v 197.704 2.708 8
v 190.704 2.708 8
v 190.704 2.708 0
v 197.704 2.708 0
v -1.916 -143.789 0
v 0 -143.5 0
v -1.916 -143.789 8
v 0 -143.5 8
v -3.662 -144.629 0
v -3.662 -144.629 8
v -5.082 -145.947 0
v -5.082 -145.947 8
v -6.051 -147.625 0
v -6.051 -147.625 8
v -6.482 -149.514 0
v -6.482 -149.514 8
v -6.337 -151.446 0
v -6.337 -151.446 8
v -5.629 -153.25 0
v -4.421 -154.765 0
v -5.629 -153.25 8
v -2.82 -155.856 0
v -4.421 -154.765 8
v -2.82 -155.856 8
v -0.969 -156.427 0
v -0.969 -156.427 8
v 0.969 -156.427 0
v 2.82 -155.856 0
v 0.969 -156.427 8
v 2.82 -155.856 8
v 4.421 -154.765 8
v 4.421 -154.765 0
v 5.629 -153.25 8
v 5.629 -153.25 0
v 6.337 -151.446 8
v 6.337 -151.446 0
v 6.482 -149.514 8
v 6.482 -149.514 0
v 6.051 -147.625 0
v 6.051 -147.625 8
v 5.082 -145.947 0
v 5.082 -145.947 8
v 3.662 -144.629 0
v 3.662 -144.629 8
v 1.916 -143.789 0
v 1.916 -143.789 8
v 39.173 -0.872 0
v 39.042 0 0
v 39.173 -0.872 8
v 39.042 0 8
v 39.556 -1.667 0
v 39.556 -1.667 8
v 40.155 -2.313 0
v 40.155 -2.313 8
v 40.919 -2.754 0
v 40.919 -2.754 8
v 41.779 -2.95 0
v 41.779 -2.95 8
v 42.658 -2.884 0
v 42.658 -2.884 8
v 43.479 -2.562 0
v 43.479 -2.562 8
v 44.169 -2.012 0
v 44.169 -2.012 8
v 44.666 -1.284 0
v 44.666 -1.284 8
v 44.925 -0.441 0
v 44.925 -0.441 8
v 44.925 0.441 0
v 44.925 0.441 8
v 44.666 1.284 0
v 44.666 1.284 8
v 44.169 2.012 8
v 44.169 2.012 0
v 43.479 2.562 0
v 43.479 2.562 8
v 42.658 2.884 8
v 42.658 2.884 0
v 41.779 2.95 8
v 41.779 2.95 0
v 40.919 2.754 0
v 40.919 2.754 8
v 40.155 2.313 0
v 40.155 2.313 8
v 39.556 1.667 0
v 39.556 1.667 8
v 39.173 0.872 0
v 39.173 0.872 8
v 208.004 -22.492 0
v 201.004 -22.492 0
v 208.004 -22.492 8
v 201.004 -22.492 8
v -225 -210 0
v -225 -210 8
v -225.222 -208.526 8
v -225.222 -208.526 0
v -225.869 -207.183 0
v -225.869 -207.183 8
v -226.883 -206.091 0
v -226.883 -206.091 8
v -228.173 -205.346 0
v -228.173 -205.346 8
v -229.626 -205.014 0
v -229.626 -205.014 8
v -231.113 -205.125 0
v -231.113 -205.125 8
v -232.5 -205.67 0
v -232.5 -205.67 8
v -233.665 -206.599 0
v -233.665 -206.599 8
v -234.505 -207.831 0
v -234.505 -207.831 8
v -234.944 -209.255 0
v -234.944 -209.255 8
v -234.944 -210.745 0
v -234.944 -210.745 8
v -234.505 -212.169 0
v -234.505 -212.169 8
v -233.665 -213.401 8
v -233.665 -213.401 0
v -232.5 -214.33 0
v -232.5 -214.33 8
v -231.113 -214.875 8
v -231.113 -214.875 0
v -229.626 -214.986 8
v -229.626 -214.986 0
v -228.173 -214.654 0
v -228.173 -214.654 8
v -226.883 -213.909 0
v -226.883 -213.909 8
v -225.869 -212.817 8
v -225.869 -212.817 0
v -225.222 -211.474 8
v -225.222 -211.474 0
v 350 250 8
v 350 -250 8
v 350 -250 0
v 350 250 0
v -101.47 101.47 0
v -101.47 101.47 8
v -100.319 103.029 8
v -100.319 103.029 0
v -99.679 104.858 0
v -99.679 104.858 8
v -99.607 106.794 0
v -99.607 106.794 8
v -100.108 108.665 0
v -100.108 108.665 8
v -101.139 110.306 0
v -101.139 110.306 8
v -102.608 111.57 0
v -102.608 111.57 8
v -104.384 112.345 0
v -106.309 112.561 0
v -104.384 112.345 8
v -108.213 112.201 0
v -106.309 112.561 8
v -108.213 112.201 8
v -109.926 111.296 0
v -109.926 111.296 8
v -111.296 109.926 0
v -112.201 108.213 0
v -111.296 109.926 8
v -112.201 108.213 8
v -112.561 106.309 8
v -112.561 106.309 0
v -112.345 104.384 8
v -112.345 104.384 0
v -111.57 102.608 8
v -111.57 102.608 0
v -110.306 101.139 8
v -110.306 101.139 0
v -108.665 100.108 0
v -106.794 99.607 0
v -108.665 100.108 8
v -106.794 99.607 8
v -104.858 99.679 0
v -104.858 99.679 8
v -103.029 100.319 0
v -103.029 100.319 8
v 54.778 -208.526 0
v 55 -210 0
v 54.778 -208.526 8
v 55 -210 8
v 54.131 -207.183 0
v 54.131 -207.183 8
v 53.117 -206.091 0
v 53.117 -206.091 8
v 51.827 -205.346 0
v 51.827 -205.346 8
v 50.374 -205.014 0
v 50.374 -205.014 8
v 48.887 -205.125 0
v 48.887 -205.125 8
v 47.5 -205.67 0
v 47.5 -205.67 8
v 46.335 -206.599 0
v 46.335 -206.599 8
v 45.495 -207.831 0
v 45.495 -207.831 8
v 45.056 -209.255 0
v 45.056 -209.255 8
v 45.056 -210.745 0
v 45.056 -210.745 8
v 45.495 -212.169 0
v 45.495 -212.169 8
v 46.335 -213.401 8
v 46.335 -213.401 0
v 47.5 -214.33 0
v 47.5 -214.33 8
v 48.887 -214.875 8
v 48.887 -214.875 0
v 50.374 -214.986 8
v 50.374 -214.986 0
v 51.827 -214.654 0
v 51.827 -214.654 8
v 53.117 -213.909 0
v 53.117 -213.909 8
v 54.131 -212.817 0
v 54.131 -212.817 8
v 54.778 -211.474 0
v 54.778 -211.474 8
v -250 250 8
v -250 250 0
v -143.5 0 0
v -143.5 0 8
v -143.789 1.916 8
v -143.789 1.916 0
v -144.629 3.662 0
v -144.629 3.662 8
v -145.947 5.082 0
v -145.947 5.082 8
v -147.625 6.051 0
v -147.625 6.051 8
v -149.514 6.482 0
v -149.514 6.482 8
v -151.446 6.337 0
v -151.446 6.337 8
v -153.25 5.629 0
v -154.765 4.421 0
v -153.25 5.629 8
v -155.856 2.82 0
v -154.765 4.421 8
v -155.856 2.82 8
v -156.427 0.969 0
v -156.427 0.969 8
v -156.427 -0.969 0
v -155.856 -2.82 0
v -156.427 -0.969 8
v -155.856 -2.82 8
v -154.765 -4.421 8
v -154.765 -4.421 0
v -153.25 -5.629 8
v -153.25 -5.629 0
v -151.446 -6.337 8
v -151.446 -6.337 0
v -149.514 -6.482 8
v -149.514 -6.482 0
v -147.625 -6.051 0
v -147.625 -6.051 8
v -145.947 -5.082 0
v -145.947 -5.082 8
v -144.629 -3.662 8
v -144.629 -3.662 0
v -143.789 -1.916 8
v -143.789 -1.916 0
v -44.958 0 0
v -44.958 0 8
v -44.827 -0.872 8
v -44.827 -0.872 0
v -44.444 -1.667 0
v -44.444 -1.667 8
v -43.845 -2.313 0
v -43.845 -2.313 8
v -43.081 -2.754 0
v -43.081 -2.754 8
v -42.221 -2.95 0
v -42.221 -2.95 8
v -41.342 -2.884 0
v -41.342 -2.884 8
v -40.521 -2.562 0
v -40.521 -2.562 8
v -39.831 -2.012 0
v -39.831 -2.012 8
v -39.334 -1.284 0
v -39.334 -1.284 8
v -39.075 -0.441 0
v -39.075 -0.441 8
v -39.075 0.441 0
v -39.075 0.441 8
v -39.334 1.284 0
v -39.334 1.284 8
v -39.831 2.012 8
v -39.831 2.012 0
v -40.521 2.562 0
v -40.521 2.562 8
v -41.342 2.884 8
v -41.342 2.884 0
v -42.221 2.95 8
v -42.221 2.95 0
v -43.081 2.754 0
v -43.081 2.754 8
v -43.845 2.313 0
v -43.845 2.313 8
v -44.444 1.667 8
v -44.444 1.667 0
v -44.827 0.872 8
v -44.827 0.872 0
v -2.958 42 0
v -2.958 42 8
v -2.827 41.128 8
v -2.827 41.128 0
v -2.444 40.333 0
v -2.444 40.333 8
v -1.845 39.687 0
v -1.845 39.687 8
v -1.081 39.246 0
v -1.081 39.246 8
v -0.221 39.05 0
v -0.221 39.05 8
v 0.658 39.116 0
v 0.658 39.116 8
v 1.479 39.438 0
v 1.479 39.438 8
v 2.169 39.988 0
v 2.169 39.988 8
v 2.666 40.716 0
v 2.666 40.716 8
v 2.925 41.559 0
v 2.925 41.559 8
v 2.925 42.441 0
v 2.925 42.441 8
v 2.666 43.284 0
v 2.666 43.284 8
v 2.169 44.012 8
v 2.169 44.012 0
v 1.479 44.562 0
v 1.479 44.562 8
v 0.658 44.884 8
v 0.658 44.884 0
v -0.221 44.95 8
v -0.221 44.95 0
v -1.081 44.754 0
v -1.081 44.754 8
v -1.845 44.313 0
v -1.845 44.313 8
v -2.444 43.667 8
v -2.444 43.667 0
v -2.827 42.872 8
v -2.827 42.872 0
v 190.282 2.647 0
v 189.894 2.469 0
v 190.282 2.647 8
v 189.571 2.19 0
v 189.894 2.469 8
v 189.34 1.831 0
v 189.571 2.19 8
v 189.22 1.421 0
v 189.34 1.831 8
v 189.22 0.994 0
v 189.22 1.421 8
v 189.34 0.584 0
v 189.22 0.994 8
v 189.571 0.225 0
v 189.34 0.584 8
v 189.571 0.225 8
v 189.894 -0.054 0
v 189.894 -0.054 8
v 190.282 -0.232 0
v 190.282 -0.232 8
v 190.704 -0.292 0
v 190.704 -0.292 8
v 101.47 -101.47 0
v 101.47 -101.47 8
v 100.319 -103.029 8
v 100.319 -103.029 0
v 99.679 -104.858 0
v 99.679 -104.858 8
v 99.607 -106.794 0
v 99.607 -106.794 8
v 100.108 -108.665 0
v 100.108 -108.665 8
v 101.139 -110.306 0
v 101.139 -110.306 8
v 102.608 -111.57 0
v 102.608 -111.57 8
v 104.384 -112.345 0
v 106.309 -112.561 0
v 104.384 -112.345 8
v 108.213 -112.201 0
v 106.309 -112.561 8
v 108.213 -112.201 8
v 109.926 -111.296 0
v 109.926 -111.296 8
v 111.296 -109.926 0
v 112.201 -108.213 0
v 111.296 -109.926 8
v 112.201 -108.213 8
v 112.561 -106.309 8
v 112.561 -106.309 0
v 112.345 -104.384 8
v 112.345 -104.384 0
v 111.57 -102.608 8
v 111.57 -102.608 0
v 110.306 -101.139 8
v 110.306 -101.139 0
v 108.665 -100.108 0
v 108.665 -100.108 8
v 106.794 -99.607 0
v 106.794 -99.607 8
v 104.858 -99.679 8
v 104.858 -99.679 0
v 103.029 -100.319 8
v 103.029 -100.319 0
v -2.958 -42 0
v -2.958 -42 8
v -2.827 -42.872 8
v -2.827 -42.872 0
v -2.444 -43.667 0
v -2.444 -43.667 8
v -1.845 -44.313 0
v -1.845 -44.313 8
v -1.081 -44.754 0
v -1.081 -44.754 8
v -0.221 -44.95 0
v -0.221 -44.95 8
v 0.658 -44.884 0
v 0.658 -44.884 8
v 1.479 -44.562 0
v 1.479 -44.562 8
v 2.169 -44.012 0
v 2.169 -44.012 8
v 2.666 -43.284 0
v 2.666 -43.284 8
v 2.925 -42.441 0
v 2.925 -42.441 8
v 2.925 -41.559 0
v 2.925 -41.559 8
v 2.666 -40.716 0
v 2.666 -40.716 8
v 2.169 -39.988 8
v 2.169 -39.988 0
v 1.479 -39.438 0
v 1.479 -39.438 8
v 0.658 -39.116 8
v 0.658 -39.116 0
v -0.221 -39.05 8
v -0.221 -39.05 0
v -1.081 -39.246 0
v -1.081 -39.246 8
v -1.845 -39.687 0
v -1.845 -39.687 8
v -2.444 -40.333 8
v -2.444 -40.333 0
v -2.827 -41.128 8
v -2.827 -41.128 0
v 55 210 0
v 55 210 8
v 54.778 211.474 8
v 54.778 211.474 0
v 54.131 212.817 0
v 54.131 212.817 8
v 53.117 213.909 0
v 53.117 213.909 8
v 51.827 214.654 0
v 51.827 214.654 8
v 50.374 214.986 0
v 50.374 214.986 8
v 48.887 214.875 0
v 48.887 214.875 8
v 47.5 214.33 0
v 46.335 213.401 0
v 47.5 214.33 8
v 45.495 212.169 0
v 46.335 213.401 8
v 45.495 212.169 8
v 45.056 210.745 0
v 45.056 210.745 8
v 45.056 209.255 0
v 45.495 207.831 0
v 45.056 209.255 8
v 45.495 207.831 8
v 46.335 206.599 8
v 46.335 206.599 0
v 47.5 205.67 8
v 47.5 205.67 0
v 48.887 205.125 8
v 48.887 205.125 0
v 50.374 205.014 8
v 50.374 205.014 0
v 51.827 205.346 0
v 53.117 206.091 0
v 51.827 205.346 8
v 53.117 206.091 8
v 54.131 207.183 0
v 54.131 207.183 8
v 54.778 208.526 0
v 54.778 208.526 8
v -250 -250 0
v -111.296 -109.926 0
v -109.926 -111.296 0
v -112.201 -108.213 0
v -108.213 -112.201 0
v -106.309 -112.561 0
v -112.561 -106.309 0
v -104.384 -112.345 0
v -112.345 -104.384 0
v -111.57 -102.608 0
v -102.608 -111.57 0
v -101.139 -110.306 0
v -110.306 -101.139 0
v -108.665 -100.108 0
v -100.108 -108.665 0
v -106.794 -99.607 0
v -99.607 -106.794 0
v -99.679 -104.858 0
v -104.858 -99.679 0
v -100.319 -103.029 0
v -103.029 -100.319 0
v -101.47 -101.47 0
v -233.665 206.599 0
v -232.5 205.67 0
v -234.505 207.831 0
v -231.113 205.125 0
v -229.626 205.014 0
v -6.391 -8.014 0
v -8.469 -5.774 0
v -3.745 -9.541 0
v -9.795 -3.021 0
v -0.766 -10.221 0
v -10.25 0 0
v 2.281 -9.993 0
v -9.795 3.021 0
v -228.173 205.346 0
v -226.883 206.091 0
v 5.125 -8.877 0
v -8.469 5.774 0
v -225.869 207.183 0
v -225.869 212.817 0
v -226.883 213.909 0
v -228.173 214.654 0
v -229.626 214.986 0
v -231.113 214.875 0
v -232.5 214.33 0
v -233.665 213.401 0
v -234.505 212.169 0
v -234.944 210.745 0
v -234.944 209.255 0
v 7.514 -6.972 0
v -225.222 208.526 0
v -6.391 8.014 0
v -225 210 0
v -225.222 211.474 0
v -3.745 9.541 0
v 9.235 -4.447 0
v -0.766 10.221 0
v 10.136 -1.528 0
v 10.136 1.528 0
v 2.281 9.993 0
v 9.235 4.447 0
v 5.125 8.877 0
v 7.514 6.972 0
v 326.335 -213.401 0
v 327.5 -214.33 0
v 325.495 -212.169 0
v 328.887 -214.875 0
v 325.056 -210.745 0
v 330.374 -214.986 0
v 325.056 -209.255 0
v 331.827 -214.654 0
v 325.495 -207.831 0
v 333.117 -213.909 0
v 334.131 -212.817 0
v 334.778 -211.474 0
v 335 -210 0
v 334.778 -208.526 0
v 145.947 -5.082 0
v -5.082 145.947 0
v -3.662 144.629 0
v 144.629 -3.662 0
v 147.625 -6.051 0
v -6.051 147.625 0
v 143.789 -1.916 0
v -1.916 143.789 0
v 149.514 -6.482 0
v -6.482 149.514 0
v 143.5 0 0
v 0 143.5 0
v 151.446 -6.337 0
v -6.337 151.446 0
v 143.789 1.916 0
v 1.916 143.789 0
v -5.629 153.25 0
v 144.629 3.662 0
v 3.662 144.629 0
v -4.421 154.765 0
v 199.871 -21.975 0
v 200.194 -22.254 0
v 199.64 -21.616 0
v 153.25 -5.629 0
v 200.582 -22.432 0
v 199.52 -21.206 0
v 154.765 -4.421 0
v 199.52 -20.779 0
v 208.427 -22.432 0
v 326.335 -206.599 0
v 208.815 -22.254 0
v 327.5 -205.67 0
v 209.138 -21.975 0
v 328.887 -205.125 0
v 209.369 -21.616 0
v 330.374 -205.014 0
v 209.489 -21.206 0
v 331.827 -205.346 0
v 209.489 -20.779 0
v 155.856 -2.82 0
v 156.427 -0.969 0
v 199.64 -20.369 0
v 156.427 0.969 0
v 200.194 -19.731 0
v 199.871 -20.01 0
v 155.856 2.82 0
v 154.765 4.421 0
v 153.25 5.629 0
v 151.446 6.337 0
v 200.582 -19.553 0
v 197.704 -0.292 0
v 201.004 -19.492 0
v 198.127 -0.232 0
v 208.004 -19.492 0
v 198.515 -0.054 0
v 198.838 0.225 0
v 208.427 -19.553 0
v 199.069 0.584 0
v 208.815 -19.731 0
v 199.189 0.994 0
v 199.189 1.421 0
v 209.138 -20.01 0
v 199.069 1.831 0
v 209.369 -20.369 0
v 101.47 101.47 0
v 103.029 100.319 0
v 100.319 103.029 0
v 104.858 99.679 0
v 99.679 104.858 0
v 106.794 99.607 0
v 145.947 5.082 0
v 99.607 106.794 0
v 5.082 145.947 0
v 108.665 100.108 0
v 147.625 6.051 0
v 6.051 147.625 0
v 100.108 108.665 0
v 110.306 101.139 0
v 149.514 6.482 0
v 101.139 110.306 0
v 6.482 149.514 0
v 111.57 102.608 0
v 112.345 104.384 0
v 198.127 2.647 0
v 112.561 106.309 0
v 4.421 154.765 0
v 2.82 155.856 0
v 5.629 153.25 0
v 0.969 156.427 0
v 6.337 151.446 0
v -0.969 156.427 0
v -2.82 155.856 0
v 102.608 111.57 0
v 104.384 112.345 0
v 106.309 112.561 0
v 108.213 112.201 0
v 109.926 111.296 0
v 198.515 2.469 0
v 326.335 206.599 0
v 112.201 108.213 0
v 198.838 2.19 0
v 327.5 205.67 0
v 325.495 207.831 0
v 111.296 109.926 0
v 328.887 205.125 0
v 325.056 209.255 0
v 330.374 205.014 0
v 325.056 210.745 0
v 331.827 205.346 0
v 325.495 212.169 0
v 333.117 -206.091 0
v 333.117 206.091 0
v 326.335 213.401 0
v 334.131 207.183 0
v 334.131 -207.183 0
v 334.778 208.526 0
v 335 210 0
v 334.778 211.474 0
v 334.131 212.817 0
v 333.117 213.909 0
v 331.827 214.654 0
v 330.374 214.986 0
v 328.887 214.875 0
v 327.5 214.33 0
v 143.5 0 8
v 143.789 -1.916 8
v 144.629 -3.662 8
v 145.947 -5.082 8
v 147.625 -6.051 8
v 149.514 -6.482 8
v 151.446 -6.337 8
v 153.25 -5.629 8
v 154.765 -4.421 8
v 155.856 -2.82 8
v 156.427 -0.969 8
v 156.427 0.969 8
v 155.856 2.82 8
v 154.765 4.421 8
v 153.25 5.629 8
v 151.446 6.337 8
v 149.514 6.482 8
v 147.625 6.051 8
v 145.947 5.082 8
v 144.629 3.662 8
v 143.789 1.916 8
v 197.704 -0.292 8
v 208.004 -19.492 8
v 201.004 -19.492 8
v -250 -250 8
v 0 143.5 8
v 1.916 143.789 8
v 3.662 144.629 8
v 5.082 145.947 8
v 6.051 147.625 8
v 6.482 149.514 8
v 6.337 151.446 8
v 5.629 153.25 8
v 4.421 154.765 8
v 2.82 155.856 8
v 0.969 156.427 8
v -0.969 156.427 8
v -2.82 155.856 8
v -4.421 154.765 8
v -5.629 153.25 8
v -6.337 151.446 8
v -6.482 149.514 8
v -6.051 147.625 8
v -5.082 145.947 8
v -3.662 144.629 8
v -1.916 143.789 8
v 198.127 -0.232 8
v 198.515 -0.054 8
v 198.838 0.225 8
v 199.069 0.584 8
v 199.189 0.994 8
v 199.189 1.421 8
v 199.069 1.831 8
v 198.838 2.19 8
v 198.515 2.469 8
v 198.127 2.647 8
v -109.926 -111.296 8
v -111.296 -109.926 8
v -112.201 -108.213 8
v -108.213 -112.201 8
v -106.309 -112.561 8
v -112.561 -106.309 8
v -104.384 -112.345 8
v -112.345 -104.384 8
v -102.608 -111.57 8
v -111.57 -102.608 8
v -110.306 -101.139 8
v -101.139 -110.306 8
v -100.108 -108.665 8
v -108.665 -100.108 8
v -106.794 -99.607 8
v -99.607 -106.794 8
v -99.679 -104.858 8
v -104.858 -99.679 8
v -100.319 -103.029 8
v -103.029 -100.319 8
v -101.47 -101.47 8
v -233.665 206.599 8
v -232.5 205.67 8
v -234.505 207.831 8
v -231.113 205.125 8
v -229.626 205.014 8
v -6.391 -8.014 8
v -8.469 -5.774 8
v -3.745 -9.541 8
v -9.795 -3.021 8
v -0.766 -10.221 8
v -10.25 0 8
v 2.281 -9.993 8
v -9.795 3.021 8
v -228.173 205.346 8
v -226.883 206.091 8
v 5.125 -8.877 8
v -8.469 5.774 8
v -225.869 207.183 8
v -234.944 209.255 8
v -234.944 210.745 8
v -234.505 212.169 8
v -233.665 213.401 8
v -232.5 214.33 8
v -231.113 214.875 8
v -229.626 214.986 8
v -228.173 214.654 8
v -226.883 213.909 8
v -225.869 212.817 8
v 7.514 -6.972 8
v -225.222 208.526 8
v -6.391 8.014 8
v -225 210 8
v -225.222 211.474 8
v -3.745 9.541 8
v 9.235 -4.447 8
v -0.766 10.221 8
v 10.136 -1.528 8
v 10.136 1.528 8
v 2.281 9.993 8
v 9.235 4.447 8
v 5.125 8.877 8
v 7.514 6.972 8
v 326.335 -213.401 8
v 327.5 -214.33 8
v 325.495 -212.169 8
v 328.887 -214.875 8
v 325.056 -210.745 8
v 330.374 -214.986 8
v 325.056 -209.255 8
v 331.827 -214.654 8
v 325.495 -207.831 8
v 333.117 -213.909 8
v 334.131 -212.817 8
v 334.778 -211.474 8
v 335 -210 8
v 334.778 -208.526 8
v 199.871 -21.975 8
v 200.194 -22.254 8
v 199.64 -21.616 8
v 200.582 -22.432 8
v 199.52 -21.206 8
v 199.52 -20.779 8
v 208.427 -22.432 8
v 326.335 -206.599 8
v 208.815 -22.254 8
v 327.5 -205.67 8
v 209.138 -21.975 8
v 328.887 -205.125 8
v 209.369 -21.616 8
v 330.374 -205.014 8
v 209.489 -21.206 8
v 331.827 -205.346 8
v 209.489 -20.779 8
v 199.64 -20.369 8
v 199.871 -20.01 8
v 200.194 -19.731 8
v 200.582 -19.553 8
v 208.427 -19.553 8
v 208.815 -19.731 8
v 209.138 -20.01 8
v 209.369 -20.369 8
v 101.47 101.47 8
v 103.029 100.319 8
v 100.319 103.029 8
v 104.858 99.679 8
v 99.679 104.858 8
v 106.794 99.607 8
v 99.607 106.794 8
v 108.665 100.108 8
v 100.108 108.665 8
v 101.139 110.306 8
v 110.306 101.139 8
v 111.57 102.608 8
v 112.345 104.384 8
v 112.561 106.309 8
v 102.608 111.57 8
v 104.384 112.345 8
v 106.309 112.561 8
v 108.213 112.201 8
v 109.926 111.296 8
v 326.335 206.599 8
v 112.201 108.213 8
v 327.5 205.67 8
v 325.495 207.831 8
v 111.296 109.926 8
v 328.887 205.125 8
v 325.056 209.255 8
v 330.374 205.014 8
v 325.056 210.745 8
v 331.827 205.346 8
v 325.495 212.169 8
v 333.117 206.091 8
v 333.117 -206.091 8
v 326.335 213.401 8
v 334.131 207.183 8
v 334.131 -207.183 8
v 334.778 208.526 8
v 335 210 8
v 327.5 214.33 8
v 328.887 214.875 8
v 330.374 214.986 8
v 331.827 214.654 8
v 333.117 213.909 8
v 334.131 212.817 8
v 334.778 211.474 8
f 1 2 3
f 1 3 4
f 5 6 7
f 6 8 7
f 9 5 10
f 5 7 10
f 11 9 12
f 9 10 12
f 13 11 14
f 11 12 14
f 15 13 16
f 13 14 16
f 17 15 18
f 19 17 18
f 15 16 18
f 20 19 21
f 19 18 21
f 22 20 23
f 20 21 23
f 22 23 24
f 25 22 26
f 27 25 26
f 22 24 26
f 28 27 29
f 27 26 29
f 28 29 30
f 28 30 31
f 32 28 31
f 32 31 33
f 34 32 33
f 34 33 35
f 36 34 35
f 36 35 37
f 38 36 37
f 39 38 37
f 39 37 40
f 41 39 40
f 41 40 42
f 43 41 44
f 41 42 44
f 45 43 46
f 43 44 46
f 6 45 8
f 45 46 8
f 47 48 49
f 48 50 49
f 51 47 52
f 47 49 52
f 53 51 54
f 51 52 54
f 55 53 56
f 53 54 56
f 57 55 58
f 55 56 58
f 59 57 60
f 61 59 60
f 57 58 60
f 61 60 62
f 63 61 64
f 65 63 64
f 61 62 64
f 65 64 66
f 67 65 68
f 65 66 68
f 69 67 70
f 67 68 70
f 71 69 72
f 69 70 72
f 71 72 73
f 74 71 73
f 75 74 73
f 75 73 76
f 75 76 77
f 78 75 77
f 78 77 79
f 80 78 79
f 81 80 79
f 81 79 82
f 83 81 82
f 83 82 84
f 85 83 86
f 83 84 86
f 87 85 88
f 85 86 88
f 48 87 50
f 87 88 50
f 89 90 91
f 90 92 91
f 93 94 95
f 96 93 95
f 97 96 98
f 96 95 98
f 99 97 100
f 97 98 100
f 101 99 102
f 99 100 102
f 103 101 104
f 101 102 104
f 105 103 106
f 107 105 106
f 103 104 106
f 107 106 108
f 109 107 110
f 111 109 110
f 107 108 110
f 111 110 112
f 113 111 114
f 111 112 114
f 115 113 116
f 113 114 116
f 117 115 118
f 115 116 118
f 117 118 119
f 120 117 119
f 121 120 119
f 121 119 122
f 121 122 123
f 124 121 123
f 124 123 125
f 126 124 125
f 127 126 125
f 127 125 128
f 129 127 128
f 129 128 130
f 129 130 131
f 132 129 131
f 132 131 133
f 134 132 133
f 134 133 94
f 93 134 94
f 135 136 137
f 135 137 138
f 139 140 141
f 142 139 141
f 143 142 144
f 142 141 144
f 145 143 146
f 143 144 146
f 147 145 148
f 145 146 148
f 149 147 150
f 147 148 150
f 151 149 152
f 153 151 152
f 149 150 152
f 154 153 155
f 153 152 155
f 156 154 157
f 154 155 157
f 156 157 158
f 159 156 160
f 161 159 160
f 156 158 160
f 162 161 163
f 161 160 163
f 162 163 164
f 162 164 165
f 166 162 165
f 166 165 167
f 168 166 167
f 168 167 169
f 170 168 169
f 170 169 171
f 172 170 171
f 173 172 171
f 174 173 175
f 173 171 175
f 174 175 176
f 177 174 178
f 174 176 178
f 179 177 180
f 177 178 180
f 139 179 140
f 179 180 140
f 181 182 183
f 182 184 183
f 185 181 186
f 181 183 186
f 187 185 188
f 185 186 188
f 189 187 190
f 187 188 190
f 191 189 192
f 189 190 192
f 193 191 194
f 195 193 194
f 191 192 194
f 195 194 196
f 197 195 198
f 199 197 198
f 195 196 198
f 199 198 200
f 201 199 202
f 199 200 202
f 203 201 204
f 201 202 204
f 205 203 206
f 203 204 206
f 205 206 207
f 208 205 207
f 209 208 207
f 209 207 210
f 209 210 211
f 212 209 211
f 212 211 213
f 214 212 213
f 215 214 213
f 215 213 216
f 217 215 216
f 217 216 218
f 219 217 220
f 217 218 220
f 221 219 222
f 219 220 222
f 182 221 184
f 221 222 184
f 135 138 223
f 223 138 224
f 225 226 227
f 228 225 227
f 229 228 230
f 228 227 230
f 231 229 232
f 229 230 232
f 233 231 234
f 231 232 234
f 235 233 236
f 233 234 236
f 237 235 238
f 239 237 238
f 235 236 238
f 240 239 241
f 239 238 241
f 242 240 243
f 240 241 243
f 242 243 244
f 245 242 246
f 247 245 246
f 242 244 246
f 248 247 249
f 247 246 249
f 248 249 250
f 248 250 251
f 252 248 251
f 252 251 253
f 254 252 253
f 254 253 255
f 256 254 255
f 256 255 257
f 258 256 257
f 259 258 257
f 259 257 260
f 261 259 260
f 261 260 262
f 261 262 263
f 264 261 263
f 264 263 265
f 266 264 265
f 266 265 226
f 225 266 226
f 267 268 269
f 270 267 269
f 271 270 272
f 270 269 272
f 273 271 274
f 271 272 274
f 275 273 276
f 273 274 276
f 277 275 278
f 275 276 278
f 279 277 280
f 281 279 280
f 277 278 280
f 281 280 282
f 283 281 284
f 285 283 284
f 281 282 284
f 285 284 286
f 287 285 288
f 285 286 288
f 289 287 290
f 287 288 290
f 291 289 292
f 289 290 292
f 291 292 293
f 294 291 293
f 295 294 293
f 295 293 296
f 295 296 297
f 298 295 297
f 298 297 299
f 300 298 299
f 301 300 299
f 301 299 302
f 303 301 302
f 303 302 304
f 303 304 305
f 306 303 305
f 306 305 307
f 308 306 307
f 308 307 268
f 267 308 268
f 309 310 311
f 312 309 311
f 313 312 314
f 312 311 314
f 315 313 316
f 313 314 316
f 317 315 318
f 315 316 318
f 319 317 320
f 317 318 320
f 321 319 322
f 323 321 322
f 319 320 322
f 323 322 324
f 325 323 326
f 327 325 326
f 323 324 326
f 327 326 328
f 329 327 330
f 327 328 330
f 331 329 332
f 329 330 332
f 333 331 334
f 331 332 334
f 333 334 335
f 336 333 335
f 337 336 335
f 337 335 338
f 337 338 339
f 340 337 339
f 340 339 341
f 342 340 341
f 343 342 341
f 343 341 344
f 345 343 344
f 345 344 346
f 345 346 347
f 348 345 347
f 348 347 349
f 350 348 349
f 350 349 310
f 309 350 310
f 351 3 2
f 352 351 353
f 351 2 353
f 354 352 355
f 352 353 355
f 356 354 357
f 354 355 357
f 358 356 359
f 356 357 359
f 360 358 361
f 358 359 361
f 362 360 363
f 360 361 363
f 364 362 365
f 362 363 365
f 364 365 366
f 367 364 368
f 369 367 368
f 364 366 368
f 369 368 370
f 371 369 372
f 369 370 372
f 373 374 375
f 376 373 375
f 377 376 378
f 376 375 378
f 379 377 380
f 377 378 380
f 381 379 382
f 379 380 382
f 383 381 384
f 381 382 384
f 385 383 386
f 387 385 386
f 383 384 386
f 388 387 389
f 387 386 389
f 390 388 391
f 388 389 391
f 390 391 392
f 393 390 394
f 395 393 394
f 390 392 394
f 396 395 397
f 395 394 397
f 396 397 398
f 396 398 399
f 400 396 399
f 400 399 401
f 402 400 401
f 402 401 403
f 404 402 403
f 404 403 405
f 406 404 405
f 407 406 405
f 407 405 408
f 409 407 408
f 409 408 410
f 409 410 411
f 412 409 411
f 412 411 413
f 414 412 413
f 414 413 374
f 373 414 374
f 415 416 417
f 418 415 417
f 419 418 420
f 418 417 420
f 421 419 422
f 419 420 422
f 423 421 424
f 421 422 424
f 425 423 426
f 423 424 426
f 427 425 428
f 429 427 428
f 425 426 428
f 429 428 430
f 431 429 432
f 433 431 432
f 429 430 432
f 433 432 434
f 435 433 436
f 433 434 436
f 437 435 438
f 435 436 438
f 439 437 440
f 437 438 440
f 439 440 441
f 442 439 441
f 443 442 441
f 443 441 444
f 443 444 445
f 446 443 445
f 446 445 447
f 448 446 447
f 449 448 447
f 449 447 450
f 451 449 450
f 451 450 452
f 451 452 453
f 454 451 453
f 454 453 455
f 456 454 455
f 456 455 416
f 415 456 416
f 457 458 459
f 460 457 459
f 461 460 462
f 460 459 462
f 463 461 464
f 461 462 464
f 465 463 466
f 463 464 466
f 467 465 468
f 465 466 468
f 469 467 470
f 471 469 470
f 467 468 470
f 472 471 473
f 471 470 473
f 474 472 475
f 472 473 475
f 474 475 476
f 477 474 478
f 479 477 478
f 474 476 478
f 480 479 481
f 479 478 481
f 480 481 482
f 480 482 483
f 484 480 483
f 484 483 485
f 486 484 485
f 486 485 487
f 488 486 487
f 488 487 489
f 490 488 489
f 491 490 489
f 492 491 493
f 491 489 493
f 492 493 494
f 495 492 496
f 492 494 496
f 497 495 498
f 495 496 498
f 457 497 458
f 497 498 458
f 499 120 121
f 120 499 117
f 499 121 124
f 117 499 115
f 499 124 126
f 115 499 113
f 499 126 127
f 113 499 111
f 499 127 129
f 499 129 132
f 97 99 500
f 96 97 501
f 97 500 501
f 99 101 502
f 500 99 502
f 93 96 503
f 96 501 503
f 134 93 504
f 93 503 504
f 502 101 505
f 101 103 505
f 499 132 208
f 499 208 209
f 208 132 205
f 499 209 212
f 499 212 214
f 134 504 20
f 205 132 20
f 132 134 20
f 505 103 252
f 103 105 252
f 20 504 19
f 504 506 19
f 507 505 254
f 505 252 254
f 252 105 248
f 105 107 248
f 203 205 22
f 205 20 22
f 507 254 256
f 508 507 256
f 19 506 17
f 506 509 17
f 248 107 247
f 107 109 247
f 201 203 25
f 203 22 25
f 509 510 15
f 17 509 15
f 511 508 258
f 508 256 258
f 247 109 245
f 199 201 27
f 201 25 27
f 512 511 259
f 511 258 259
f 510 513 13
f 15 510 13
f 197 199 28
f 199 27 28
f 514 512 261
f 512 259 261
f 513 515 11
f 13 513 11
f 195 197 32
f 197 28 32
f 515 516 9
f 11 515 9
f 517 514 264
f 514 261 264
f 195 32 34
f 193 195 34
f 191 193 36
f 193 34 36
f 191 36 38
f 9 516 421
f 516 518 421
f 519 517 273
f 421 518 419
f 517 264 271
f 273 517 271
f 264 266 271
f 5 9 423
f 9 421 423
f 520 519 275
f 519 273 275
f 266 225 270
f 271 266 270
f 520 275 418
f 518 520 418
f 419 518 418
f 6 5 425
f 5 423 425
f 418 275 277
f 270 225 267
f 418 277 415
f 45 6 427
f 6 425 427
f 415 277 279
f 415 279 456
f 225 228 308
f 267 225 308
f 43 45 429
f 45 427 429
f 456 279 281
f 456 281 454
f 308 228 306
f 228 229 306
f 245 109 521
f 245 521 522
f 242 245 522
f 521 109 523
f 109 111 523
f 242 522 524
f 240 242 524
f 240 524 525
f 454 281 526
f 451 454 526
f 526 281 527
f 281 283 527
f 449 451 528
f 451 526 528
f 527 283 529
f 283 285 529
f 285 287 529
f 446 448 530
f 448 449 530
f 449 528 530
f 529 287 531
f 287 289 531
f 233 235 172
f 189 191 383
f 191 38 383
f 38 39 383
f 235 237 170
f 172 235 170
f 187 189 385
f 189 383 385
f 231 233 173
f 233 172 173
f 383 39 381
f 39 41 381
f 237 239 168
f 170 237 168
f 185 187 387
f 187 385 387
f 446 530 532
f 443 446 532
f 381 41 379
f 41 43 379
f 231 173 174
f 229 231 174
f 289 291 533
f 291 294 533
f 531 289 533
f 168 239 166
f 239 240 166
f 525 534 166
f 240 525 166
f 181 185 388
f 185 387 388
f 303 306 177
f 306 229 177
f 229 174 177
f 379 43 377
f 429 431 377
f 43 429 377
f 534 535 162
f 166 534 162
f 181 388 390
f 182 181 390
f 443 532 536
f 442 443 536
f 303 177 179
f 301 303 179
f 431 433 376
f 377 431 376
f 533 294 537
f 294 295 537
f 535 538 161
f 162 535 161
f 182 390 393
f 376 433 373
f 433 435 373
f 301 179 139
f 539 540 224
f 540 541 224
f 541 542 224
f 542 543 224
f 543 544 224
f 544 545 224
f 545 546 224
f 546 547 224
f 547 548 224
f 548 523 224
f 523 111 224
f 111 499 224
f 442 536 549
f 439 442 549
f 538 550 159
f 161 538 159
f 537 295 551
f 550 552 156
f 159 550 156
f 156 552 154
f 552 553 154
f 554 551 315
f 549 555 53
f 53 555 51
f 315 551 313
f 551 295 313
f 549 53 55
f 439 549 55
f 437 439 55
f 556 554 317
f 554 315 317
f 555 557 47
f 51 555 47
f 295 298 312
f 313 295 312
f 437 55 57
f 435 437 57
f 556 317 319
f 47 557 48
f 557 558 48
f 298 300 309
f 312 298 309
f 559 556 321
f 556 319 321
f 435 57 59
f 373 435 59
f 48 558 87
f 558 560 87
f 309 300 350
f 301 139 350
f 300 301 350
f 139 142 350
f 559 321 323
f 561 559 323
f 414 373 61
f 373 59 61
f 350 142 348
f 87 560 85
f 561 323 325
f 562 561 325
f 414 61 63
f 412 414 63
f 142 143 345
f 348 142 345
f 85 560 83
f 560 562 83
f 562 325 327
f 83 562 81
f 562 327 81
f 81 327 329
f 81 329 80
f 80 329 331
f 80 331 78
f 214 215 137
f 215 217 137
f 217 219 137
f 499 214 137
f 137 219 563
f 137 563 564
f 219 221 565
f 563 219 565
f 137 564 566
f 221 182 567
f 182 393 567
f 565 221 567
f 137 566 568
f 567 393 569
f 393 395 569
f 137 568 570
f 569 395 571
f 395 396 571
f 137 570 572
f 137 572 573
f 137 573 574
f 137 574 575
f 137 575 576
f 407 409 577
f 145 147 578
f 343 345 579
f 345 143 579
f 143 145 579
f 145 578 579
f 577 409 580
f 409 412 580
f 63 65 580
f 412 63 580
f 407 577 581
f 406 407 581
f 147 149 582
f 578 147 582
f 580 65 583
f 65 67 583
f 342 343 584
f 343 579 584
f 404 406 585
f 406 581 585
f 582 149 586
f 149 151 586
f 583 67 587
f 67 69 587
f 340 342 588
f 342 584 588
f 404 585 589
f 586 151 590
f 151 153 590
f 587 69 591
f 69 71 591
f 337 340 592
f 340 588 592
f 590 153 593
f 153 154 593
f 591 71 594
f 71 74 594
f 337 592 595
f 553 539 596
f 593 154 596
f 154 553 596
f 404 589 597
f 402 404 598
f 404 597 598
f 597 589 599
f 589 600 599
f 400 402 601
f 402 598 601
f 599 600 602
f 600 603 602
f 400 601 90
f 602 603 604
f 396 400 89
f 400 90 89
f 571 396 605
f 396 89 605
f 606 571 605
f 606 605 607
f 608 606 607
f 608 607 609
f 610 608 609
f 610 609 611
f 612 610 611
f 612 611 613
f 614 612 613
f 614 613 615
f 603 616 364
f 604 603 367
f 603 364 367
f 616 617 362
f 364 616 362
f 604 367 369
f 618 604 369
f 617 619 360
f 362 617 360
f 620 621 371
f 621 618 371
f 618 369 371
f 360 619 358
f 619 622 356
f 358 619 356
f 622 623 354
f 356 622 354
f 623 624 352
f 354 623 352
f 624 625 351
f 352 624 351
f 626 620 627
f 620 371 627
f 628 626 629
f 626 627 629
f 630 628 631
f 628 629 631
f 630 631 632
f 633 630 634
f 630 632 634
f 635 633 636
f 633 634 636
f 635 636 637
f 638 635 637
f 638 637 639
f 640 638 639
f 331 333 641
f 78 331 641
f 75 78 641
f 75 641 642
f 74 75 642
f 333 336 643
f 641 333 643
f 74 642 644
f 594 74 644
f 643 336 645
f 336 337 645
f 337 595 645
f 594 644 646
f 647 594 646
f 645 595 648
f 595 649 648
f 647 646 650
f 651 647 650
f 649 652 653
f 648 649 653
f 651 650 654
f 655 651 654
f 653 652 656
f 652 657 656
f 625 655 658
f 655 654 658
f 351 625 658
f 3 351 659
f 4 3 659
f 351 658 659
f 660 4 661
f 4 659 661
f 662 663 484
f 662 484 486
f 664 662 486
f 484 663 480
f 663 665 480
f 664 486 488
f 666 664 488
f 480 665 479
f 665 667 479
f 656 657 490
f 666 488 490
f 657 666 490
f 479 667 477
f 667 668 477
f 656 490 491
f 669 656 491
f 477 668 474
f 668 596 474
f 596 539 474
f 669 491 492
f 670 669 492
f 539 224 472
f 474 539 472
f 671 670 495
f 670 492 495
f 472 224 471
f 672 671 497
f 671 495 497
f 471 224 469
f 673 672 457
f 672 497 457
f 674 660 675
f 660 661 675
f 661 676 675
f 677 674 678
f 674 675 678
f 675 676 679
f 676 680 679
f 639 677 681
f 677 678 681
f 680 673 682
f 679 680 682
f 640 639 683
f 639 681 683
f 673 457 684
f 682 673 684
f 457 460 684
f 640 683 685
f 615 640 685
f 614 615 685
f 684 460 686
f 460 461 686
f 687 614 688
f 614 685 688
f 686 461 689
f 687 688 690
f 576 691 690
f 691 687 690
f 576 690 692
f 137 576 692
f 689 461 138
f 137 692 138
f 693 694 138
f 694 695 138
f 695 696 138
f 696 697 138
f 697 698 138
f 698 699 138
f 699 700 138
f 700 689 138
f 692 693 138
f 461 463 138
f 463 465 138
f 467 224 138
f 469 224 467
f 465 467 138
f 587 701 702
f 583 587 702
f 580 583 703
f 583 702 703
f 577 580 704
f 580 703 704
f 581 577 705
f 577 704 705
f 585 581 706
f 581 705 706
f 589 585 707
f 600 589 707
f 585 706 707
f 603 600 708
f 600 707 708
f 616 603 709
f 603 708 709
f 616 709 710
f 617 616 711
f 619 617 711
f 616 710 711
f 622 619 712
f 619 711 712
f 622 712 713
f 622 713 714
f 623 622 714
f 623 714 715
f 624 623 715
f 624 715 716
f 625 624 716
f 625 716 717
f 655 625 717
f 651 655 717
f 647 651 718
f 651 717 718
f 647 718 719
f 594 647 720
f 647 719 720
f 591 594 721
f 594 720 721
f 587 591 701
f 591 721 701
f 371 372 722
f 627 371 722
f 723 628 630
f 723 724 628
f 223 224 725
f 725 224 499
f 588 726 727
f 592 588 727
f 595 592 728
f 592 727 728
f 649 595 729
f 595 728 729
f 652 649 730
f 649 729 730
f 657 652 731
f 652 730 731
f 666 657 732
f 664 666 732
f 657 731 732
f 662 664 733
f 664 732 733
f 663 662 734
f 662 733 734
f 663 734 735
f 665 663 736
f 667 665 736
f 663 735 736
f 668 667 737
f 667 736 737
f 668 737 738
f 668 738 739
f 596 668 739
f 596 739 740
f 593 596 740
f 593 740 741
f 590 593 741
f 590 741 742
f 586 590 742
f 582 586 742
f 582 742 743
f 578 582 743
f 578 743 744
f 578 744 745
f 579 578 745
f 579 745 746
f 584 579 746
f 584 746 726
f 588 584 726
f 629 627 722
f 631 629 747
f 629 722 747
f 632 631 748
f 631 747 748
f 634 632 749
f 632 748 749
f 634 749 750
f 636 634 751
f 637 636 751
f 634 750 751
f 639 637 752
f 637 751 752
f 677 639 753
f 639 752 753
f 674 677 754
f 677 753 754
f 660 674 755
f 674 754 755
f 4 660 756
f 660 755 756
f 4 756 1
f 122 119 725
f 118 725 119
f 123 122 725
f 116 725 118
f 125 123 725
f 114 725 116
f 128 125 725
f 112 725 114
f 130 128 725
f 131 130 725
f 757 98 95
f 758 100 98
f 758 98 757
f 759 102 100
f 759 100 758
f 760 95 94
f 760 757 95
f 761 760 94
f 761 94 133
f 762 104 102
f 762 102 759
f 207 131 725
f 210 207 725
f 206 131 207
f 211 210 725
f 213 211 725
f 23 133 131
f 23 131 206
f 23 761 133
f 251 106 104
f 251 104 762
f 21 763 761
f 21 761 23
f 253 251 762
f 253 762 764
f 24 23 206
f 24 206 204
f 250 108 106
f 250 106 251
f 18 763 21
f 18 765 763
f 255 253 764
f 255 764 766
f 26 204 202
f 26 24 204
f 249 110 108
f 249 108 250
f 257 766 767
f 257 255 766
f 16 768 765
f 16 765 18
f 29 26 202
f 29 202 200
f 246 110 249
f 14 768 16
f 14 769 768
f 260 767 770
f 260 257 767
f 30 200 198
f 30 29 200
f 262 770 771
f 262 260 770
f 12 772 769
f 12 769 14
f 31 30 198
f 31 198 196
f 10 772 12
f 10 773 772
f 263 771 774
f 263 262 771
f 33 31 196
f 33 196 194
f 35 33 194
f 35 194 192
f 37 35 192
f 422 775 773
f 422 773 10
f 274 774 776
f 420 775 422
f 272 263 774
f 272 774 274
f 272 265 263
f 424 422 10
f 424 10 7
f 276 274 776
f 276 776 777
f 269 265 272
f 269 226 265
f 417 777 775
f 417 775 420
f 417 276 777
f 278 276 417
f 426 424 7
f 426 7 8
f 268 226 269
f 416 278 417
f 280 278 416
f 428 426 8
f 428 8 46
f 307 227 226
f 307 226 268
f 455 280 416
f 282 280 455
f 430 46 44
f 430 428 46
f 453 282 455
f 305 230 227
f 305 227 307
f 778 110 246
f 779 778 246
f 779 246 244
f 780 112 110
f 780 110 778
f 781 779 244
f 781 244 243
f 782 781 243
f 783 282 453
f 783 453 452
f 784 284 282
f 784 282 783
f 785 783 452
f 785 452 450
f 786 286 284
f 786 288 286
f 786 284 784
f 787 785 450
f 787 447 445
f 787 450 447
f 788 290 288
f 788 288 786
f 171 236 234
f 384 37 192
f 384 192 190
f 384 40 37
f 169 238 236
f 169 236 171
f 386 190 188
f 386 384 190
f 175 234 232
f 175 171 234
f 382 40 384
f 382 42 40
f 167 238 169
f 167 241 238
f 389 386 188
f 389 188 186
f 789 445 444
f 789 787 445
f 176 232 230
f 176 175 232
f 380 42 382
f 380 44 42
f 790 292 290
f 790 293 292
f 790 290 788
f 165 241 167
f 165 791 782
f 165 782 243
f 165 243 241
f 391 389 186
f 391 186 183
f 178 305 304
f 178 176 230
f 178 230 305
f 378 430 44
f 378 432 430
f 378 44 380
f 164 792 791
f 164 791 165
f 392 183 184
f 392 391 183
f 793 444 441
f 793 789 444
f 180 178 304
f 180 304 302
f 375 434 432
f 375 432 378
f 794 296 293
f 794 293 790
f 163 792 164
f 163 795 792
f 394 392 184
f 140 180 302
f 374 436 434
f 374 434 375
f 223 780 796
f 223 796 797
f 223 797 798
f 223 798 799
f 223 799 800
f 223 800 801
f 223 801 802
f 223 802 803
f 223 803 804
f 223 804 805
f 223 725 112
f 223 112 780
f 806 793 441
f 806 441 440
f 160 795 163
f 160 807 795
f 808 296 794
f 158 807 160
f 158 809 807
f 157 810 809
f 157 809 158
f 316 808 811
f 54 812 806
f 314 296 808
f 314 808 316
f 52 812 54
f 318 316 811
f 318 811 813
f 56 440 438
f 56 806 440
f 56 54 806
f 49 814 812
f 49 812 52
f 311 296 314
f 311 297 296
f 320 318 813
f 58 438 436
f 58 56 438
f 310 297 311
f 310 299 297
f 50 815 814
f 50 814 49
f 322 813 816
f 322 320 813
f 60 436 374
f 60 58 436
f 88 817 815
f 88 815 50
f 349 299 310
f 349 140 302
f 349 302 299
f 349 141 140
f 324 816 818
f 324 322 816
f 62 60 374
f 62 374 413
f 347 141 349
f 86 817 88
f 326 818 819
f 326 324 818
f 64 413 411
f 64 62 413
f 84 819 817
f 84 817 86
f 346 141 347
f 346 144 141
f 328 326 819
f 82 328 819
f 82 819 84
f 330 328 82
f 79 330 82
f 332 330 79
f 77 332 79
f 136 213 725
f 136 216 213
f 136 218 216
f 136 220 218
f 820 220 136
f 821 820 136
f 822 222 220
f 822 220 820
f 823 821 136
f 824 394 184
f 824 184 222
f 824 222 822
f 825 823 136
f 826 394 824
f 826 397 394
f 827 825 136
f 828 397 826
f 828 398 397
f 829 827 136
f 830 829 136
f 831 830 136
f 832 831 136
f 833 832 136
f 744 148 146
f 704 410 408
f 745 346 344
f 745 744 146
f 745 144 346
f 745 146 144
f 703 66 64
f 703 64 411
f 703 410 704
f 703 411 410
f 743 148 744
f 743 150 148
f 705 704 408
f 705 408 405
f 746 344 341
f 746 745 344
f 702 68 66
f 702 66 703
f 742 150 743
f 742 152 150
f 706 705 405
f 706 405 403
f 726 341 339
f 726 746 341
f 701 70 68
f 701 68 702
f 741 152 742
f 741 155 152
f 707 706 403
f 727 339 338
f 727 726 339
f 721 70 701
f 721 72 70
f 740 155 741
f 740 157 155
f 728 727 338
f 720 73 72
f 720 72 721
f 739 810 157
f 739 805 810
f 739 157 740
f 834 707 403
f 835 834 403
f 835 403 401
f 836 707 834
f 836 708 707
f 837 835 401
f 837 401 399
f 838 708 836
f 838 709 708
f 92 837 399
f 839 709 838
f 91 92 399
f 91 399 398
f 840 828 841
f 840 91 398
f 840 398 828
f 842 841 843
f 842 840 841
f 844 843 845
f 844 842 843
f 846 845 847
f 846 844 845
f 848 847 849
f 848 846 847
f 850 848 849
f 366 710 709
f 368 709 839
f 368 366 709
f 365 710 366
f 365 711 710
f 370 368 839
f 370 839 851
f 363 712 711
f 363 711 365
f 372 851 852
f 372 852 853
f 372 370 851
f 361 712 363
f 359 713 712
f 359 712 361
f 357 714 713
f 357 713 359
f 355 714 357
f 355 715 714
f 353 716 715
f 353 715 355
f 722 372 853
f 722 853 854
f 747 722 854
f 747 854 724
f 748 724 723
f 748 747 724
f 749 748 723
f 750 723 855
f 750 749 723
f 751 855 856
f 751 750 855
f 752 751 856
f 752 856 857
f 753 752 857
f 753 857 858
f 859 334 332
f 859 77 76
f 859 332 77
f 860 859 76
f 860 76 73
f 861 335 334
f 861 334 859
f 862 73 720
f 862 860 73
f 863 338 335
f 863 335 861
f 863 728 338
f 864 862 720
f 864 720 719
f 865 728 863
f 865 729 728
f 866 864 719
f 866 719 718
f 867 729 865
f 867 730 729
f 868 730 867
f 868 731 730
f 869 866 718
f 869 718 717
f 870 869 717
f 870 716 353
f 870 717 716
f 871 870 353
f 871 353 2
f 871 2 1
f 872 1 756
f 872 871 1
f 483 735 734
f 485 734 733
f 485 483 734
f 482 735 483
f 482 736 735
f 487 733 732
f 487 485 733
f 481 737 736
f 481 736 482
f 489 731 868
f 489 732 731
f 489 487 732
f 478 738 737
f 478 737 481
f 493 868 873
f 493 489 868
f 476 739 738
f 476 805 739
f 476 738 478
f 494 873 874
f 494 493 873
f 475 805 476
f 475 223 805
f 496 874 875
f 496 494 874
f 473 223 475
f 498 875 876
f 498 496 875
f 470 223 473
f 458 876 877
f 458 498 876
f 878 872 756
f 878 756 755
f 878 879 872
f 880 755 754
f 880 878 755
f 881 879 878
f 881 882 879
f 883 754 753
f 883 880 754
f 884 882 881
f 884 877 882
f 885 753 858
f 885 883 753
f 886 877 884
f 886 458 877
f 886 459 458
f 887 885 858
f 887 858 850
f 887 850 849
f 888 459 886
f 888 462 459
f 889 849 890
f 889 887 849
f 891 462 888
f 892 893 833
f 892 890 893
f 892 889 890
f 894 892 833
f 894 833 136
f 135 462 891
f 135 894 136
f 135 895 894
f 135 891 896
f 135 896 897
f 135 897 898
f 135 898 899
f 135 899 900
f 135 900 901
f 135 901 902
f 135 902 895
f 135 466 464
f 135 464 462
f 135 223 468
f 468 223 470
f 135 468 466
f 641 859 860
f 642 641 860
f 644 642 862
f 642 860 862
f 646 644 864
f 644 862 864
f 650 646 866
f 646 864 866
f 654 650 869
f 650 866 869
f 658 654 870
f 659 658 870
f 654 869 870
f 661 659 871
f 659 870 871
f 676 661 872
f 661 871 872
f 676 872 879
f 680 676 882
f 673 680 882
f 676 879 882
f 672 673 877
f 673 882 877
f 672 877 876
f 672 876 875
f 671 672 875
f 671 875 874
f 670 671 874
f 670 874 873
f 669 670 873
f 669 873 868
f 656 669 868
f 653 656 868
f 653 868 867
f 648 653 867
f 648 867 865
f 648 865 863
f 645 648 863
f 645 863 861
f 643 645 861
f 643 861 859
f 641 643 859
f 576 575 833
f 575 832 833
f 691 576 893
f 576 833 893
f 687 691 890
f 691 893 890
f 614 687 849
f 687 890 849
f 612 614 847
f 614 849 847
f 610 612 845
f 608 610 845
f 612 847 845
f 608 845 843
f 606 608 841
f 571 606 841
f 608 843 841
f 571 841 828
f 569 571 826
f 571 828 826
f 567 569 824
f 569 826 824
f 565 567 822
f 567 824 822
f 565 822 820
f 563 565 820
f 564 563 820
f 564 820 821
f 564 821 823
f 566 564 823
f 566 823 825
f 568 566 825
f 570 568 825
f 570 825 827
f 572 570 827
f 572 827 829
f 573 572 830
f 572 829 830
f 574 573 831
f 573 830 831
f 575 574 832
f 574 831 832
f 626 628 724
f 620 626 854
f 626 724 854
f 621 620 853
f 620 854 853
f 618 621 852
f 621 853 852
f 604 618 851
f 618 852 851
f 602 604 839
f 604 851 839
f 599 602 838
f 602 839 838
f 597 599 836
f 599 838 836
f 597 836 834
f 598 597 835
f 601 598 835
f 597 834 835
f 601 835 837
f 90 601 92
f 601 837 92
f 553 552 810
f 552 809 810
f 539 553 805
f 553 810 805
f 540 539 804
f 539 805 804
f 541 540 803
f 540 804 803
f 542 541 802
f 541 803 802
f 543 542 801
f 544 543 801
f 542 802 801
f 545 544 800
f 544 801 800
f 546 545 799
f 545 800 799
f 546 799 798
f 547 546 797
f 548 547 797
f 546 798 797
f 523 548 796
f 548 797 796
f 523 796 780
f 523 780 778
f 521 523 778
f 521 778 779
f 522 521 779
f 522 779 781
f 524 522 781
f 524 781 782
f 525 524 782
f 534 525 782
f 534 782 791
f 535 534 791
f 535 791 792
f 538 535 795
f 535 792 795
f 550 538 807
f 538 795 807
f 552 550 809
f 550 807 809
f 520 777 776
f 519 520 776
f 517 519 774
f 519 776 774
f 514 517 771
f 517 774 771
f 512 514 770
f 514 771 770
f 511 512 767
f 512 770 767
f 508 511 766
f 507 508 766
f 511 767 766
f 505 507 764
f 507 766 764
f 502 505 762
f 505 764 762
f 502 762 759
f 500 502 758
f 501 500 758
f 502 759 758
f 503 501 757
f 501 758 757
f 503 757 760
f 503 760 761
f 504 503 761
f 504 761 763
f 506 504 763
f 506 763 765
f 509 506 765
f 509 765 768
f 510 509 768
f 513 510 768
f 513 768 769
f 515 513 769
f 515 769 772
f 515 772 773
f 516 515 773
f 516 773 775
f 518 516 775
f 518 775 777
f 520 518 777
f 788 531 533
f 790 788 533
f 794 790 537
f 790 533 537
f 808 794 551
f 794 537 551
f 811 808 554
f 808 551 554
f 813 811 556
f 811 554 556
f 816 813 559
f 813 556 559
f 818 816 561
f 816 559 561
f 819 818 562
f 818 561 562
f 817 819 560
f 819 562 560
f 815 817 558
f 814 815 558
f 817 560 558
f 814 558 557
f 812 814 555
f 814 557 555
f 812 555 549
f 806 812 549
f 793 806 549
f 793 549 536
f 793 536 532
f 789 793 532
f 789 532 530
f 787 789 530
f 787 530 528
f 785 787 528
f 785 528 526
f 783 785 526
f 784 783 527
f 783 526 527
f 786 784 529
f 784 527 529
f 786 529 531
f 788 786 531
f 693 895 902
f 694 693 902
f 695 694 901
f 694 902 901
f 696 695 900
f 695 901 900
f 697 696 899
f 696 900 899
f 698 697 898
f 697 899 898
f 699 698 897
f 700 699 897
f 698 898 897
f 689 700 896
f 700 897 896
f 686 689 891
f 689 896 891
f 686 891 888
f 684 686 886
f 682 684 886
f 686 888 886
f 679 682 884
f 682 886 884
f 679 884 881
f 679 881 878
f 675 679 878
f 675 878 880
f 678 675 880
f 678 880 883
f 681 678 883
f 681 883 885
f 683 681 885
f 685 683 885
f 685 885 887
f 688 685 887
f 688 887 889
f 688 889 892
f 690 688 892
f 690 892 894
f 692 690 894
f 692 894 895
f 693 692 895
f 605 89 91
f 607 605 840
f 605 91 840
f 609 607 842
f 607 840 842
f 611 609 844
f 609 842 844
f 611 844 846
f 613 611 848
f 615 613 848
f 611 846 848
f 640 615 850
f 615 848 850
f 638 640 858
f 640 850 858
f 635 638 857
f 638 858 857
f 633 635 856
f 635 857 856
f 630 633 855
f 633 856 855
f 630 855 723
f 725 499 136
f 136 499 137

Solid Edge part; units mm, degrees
sketch "Sketch1" plane through (0, 0, 0) normal (0, 0, 1) x (1, 0, 0)
  line L0 (-250, -250) -> (250, -250)
  line L1 (250, -250) -> (250, 250)
  line L2 (250, 250) -> (-250, 250)
  line L3 (-250, 250) -> (-250, -250)
extrude "ProtrusioneEstrusa_1" add sketch "Sketch1" along normal blind 8
hole "Foro_1" at (0, 150, 8) direction (0, 0, -1) diameter 13 end through all
pattern_circular "Pattern1" count 8 over 360 about axis through (0, 0, 8) along (0, 0, -1) of "Foro_1"
sketch "Sketch2" plane through (0, 0, 0) normal (0, 0, -1) x (-1, 0, 0)
  circle A0 centre (0, 0) radius 10.25
extrude "Cutout1" cut sketch "Sketch2" against normal through all
sketch "Sketch3" plane through (0, 0, 8) normal (0, 0, 1) x (-1, 0, 0)
  circle A0 centre (0, 42) radius 2.9585
  circle A1 centre (42, 0) radius 2.9585
  circle A2 centre (0, -42) radius 2.9585
  circle A3 centre (-42, 0) radius 2.9585
extrude "Cutout2" cut sketch "Sketch3" against normal through all
sketch "Sketch4" plane through (0, 0, 8) normal (0, 0, 1) x (1, 0, 0)
  line L0 (250, -250) -> (350, -250)
  line L1 (350, -250) -> (350, 250)
  line L2 (250, 250) -> (350, 250)
  line L3 (250, -250) -> (250, 250)
extrude "Protrusion1" add sketch "Sketch4" against normal up to vertex (8 mm away)
sketch "Sketch5" plane through (50, 0, 8) normal (0, 0, 1) x (1, 0, 0)
  circle A0 centre (-280, -210) radius 5
  circle A1 centre (0, -210) radius 5
  circle A2 centre (280, -210) radius 5
  dimension "D1" = 20
  dimension "D2" = 20
extrude "Cutout3" cut sketch "Sketch5" against normal through all
mirror "Mirror1" about plane through (0, 0, 0) normal (0, -1, 0) of "Cutout3"
sketch "Sketch6" plane through (50, 0, 8) normal (0, 0, 1) x (0, 1, 0)
  arc A0 (-0.2925, -140.7045) -> (2.7075, -140.7045) centre (1.2075, -140.7045) cw
  line L0 (2.7075, -140.7045) -> (2.7075, -147.7045)
  arc A1 (2.7075, -147.7045) -> (-0.2925, -147.7045) centre (1.2075, -147.7045) cw
  line L1 (-0.2925, -140.7045) -> (-0.2925, -147.7045)
  line L2 (-19.4925, -151.0045) -> (-19.4925, -158.0045)
  arc A2 (-19.4925, -158.0045) -> (-22.4925, -158.0045) centre (-20.9925, -158.0045) cw
  line L3 (-22.4925, -151.0045) -> (-22.4925, -158.0045)
  arc A3 (-22.4925, -151.0045) -> (-19.4925, -151.0045) centre (-20.9925, -151.0045) cw
extrude "Cutout5" cut sketch "Sketch6" against normal through all
properties material "Acrylic Plastic (extra strong)"
